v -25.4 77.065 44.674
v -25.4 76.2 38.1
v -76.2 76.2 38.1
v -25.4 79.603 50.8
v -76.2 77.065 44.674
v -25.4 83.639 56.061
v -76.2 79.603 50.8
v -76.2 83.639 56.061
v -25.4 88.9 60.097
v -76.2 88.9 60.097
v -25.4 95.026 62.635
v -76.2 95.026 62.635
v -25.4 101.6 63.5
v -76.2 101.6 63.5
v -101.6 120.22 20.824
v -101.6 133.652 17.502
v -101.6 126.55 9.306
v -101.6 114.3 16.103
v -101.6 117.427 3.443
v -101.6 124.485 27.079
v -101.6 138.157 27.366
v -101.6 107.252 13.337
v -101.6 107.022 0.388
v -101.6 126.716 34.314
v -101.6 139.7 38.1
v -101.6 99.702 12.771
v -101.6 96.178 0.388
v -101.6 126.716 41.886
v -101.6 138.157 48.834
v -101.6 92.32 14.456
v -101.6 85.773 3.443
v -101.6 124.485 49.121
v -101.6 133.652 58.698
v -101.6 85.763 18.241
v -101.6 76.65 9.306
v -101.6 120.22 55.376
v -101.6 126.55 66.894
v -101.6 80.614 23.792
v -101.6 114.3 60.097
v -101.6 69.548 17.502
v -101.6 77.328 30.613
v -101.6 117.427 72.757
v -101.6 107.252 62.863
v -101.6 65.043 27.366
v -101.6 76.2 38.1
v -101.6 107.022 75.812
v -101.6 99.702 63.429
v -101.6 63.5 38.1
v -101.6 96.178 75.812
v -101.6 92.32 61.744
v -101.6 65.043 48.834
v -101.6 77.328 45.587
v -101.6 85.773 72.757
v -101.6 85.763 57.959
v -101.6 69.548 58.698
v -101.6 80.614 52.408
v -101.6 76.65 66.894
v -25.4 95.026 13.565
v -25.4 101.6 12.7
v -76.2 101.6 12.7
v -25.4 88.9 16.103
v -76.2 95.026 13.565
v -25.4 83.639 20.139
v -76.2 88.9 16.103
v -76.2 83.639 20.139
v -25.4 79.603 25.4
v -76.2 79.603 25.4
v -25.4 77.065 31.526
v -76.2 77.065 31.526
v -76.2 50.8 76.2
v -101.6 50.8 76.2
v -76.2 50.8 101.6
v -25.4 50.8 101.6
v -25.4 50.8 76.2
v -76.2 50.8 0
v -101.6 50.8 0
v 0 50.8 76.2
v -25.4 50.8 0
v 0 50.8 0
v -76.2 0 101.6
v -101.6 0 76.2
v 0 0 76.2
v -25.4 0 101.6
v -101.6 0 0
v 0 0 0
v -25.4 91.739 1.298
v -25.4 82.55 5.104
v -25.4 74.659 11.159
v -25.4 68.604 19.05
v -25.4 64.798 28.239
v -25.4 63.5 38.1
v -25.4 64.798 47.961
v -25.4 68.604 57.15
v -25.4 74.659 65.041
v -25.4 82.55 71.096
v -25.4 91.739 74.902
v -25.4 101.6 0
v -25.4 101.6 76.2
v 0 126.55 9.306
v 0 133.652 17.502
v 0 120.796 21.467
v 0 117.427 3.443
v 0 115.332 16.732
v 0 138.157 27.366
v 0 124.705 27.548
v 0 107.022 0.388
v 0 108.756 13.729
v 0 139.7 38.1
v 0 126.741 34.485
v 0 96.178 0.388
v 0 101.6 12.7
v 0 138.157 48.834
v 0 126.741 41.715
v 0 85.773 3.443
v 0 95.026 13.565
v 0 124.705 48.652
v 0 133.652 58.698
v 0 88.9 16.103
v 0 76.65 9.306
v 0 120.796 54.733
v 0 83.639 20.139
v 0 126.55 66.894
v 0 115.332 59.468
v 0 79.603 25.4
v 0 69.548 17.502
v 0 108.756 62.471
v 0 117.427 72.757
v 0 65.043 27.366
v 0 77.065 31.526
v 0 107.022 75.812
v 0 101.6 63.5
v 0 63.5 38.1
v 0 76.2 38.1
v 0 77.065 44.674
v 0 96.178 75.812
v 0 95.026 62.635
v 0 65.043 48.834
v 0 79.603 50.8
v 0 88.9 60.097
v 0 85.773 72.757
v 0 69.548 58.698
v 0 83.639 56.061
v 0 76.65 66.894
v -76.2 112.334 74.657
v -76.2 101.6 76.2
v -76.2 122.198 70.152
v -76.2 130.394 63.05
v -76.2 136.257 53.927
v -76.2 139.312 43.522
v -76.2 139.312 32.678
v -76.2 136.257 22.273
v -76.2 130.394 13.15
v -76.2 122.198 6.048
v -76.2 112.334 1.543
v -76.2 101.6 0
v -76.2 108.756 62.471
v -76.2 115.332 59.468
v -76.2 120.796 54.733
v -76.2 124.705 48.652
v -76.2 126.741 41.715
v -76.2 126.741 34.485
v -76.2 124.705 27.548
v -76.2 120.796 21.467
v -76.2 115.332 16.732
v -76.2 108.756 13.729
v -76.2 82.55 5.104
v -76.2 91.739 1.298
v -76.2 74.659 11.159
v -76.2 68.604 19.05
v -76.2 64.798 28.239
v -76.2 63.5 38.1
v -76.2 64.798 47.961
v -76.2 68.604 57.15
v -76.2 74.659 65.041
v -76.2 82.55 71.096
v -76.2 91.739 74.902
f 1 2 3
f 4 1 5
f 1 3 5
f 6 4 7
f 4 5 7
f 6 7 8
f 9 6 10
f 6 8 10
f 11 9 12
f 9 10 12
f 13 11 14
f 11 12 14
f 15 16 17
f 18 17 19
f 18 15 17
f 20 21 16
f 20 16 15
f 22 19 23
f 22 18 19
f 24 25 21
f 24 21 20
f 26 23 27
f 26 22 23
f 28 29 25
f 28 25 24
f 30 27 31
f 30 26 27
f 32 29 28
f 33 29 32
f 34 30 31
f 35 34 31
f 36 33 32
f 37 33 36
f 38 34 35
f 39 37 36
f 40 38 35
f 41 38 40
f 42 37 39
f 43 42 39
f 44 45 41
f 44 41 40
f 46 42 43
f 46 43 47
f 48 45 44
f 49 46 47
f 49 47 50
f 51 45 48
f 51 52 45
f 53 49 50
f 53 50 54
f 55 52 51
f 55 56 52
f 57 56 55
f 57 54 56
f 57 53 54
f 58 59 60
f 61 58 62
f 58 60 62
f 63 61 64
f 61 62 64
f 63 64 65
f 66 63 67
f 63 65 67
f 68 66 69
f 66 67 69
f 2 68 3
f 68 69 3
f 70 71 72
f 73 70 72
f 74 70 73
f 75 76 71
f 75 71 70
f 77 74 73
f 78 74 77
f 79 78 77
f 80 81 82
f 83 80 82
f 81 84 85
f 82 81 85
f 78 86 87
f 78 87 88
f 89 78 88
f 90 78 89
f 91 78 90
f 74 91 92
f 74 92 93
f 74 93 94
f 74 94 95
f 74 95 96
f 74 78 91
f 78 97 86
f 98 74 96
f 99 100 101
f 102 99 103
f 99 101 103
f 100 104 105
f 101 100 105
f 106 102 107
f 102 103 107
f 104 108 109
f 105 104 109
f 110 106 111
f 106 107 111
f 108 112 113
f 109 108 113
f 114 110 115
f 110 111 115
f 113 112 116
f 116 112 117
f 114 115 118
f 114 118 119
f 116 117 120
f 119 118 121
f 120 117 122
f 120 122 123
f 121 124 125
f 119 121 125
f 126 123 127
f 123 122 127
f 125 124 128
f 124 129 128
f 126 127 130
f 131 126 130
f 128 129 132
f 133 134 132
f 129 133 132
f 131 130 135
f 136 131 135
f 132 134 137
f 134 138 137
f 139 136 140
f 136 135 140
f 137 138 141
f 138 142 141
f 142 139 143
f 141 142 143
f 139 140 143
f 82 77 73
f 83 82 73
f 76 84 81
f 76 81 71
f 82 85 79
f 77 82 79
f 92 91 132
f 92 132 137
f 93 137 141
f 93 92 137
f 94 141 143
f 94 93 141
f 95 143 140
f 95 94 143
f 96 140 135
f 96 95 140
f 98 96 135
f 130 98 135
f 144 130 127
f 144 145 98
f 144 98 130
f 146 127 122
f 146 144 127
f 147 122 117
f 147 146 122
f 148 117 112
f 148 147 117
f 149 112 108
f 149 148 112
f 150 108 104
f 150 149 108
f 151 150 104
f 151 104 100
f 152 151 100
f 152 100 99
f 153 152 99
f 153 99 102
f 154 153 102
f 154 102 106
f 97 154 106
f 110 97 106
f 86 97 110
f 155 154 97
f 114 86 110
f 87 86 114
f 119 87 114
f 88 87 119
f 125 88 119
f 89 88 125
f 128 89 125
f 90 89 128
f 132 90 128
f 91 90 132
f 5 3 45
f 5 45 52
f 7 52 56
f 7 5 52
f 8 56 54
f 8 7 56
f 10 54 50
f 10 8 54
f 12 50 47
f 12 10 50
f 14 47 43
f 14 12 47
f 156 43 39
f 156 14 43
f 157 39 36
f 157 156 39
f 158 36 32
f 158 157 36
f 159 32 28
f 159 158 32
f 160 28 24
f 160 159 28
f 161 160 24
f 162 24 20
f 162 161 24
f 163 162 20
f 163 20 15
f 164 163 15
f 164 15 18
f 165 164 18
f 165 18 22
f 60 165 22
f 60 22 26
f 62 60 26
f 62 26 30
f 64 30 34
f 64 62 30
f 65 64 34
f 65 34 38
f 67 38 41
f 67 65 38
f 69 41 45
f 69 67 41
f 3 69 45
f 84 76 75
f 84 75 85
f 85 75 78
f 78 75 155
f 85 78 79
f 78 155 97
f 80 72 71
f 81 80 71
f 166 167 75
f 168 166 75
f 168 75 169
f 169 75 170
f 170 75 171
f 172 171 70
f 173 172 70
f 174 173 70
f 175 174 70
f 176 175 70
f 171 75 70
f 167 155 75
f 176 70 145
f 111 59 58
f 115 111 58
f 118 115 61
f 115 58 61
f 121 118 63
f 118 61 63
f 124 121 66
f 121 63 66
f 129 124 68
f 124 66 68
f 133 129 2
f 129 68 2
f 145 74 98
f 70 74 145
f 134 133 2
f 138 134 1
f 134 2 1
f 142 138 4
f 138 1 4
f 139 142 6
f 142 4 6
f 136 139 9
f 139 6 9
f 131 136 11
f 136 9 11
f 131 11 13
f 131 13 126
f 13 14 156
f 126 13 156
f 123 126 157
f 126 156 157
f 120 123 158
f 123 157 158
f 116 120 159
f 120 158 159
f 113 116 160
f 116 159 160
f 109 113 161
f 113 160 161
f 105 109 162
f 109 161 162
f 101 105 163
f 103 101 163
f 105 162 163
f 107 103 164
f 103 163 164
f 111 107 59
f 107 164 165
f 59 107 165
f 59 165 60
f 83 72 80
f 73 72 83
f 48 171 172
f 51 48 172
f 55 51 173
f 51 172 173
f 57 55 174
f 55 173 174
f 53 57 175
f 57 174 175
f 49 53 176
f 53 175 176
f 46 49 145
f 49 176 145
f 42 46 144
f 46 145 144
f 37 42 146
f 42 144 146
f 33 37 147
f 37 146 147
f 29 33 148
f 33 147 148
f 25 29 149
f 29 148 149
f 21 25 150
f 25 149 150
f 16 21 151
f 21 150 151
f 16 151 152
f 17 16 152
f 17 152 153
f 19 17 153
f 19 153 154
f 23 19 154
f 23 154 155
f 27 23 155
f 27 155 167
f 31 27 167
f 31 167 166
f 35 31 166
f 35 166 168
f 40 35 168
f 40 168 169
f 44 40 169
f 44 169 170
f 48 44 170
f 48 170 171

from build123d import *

# Parameters (mm, degrees)
F0_W          = 101.6
F0_H          = 50.8
F1_DEPTH      = 101.6
F3_DEPTH      = 50.801
F4_W          = 50.8
F4_H          = 76.2
F5_DEPTH      = 50.8
F6_R          = 38.1
F6_R_2        = 25.4
F7_DEPTH      = 25.4
F7_DEPTH_BACK = 76.2
F8_DEPTH      = 76.201


with BuildPart() as f1:
    # F0 (on Top) → F1 (new body)
    with BuildSketch(Plane.XY):
        with Locations((-50.8, 25.4)):
            Rectangle(F0_W, F0_H)
    extrude(amount=F1_DEPTH)

    # F2 (on face) → F3 (cut, through all)
    with BuildSketch(Plane(origin=(0, 50.8, 0), x_dir=(-1, 0, 0), z_dir=(0, 1, 0))):
        Polygon((0, 76.2), (25.4, 101.6), (0, 101.6), align=None)
        Polygon((101.6, 101.6), (76.2, 101.6), (101.6, 76.2), align=None)
    extrude(amount=-F3_DEPTH, mode=Mode.SUBTRACT)

    # F4 (on face) → F5 (join)
    with BuildSketch(Plane(origin=(0, 50.8, 0), x_dir=(-1, 0, 0), z_dir=(0, 1, 0))):
        with Locations((50.8, 38.1)):
            Rectangle(F4_W, F4_H)
    extrude(amount=F5_DEPTH)

    # F6 (on face) → F7 (join, two sides)
    with BuildSketch(Plane(origin=(-76.2, 0, 0), x_dir=(0, -1, 0), z_dir=(-1, 0, 0))) as f7_sk:
        with Locations((-101.6, 38.1)):
            Circle(F6_R)
        with Locations((-101.6, 38.1)):
            Circle(F6_R_2, mode=Mode.SUBTRACT)
    extrude(amount=F7_DEPTH)
    extrude(f7_sk.sketch, amount=-F7_DEPTH_BACK)

    # F7_face (on face) → F8 (cut, through all)
    with BuildSketch(Plane(origin=(-76.2, 90.819905, 38.1), x_dir=(0, -1, 0), z_dir=(-1, 0, 0))):
        with BuildLine():
            ThreePointArc((-10.780095, -25.4), (7.180417, -17.960512), (14.619905, 0))
            ThreePointArc((14.619905, 0), (7.180417, 17.960512), (-10.780095, 25.4))
            Line((-10.780095, 25.4), (-10.780095, -25.4))
        make_face()
    extrude(amount=-F8_DEPTH, mode=Mode.SUBTRACT)


solid = f1.part
